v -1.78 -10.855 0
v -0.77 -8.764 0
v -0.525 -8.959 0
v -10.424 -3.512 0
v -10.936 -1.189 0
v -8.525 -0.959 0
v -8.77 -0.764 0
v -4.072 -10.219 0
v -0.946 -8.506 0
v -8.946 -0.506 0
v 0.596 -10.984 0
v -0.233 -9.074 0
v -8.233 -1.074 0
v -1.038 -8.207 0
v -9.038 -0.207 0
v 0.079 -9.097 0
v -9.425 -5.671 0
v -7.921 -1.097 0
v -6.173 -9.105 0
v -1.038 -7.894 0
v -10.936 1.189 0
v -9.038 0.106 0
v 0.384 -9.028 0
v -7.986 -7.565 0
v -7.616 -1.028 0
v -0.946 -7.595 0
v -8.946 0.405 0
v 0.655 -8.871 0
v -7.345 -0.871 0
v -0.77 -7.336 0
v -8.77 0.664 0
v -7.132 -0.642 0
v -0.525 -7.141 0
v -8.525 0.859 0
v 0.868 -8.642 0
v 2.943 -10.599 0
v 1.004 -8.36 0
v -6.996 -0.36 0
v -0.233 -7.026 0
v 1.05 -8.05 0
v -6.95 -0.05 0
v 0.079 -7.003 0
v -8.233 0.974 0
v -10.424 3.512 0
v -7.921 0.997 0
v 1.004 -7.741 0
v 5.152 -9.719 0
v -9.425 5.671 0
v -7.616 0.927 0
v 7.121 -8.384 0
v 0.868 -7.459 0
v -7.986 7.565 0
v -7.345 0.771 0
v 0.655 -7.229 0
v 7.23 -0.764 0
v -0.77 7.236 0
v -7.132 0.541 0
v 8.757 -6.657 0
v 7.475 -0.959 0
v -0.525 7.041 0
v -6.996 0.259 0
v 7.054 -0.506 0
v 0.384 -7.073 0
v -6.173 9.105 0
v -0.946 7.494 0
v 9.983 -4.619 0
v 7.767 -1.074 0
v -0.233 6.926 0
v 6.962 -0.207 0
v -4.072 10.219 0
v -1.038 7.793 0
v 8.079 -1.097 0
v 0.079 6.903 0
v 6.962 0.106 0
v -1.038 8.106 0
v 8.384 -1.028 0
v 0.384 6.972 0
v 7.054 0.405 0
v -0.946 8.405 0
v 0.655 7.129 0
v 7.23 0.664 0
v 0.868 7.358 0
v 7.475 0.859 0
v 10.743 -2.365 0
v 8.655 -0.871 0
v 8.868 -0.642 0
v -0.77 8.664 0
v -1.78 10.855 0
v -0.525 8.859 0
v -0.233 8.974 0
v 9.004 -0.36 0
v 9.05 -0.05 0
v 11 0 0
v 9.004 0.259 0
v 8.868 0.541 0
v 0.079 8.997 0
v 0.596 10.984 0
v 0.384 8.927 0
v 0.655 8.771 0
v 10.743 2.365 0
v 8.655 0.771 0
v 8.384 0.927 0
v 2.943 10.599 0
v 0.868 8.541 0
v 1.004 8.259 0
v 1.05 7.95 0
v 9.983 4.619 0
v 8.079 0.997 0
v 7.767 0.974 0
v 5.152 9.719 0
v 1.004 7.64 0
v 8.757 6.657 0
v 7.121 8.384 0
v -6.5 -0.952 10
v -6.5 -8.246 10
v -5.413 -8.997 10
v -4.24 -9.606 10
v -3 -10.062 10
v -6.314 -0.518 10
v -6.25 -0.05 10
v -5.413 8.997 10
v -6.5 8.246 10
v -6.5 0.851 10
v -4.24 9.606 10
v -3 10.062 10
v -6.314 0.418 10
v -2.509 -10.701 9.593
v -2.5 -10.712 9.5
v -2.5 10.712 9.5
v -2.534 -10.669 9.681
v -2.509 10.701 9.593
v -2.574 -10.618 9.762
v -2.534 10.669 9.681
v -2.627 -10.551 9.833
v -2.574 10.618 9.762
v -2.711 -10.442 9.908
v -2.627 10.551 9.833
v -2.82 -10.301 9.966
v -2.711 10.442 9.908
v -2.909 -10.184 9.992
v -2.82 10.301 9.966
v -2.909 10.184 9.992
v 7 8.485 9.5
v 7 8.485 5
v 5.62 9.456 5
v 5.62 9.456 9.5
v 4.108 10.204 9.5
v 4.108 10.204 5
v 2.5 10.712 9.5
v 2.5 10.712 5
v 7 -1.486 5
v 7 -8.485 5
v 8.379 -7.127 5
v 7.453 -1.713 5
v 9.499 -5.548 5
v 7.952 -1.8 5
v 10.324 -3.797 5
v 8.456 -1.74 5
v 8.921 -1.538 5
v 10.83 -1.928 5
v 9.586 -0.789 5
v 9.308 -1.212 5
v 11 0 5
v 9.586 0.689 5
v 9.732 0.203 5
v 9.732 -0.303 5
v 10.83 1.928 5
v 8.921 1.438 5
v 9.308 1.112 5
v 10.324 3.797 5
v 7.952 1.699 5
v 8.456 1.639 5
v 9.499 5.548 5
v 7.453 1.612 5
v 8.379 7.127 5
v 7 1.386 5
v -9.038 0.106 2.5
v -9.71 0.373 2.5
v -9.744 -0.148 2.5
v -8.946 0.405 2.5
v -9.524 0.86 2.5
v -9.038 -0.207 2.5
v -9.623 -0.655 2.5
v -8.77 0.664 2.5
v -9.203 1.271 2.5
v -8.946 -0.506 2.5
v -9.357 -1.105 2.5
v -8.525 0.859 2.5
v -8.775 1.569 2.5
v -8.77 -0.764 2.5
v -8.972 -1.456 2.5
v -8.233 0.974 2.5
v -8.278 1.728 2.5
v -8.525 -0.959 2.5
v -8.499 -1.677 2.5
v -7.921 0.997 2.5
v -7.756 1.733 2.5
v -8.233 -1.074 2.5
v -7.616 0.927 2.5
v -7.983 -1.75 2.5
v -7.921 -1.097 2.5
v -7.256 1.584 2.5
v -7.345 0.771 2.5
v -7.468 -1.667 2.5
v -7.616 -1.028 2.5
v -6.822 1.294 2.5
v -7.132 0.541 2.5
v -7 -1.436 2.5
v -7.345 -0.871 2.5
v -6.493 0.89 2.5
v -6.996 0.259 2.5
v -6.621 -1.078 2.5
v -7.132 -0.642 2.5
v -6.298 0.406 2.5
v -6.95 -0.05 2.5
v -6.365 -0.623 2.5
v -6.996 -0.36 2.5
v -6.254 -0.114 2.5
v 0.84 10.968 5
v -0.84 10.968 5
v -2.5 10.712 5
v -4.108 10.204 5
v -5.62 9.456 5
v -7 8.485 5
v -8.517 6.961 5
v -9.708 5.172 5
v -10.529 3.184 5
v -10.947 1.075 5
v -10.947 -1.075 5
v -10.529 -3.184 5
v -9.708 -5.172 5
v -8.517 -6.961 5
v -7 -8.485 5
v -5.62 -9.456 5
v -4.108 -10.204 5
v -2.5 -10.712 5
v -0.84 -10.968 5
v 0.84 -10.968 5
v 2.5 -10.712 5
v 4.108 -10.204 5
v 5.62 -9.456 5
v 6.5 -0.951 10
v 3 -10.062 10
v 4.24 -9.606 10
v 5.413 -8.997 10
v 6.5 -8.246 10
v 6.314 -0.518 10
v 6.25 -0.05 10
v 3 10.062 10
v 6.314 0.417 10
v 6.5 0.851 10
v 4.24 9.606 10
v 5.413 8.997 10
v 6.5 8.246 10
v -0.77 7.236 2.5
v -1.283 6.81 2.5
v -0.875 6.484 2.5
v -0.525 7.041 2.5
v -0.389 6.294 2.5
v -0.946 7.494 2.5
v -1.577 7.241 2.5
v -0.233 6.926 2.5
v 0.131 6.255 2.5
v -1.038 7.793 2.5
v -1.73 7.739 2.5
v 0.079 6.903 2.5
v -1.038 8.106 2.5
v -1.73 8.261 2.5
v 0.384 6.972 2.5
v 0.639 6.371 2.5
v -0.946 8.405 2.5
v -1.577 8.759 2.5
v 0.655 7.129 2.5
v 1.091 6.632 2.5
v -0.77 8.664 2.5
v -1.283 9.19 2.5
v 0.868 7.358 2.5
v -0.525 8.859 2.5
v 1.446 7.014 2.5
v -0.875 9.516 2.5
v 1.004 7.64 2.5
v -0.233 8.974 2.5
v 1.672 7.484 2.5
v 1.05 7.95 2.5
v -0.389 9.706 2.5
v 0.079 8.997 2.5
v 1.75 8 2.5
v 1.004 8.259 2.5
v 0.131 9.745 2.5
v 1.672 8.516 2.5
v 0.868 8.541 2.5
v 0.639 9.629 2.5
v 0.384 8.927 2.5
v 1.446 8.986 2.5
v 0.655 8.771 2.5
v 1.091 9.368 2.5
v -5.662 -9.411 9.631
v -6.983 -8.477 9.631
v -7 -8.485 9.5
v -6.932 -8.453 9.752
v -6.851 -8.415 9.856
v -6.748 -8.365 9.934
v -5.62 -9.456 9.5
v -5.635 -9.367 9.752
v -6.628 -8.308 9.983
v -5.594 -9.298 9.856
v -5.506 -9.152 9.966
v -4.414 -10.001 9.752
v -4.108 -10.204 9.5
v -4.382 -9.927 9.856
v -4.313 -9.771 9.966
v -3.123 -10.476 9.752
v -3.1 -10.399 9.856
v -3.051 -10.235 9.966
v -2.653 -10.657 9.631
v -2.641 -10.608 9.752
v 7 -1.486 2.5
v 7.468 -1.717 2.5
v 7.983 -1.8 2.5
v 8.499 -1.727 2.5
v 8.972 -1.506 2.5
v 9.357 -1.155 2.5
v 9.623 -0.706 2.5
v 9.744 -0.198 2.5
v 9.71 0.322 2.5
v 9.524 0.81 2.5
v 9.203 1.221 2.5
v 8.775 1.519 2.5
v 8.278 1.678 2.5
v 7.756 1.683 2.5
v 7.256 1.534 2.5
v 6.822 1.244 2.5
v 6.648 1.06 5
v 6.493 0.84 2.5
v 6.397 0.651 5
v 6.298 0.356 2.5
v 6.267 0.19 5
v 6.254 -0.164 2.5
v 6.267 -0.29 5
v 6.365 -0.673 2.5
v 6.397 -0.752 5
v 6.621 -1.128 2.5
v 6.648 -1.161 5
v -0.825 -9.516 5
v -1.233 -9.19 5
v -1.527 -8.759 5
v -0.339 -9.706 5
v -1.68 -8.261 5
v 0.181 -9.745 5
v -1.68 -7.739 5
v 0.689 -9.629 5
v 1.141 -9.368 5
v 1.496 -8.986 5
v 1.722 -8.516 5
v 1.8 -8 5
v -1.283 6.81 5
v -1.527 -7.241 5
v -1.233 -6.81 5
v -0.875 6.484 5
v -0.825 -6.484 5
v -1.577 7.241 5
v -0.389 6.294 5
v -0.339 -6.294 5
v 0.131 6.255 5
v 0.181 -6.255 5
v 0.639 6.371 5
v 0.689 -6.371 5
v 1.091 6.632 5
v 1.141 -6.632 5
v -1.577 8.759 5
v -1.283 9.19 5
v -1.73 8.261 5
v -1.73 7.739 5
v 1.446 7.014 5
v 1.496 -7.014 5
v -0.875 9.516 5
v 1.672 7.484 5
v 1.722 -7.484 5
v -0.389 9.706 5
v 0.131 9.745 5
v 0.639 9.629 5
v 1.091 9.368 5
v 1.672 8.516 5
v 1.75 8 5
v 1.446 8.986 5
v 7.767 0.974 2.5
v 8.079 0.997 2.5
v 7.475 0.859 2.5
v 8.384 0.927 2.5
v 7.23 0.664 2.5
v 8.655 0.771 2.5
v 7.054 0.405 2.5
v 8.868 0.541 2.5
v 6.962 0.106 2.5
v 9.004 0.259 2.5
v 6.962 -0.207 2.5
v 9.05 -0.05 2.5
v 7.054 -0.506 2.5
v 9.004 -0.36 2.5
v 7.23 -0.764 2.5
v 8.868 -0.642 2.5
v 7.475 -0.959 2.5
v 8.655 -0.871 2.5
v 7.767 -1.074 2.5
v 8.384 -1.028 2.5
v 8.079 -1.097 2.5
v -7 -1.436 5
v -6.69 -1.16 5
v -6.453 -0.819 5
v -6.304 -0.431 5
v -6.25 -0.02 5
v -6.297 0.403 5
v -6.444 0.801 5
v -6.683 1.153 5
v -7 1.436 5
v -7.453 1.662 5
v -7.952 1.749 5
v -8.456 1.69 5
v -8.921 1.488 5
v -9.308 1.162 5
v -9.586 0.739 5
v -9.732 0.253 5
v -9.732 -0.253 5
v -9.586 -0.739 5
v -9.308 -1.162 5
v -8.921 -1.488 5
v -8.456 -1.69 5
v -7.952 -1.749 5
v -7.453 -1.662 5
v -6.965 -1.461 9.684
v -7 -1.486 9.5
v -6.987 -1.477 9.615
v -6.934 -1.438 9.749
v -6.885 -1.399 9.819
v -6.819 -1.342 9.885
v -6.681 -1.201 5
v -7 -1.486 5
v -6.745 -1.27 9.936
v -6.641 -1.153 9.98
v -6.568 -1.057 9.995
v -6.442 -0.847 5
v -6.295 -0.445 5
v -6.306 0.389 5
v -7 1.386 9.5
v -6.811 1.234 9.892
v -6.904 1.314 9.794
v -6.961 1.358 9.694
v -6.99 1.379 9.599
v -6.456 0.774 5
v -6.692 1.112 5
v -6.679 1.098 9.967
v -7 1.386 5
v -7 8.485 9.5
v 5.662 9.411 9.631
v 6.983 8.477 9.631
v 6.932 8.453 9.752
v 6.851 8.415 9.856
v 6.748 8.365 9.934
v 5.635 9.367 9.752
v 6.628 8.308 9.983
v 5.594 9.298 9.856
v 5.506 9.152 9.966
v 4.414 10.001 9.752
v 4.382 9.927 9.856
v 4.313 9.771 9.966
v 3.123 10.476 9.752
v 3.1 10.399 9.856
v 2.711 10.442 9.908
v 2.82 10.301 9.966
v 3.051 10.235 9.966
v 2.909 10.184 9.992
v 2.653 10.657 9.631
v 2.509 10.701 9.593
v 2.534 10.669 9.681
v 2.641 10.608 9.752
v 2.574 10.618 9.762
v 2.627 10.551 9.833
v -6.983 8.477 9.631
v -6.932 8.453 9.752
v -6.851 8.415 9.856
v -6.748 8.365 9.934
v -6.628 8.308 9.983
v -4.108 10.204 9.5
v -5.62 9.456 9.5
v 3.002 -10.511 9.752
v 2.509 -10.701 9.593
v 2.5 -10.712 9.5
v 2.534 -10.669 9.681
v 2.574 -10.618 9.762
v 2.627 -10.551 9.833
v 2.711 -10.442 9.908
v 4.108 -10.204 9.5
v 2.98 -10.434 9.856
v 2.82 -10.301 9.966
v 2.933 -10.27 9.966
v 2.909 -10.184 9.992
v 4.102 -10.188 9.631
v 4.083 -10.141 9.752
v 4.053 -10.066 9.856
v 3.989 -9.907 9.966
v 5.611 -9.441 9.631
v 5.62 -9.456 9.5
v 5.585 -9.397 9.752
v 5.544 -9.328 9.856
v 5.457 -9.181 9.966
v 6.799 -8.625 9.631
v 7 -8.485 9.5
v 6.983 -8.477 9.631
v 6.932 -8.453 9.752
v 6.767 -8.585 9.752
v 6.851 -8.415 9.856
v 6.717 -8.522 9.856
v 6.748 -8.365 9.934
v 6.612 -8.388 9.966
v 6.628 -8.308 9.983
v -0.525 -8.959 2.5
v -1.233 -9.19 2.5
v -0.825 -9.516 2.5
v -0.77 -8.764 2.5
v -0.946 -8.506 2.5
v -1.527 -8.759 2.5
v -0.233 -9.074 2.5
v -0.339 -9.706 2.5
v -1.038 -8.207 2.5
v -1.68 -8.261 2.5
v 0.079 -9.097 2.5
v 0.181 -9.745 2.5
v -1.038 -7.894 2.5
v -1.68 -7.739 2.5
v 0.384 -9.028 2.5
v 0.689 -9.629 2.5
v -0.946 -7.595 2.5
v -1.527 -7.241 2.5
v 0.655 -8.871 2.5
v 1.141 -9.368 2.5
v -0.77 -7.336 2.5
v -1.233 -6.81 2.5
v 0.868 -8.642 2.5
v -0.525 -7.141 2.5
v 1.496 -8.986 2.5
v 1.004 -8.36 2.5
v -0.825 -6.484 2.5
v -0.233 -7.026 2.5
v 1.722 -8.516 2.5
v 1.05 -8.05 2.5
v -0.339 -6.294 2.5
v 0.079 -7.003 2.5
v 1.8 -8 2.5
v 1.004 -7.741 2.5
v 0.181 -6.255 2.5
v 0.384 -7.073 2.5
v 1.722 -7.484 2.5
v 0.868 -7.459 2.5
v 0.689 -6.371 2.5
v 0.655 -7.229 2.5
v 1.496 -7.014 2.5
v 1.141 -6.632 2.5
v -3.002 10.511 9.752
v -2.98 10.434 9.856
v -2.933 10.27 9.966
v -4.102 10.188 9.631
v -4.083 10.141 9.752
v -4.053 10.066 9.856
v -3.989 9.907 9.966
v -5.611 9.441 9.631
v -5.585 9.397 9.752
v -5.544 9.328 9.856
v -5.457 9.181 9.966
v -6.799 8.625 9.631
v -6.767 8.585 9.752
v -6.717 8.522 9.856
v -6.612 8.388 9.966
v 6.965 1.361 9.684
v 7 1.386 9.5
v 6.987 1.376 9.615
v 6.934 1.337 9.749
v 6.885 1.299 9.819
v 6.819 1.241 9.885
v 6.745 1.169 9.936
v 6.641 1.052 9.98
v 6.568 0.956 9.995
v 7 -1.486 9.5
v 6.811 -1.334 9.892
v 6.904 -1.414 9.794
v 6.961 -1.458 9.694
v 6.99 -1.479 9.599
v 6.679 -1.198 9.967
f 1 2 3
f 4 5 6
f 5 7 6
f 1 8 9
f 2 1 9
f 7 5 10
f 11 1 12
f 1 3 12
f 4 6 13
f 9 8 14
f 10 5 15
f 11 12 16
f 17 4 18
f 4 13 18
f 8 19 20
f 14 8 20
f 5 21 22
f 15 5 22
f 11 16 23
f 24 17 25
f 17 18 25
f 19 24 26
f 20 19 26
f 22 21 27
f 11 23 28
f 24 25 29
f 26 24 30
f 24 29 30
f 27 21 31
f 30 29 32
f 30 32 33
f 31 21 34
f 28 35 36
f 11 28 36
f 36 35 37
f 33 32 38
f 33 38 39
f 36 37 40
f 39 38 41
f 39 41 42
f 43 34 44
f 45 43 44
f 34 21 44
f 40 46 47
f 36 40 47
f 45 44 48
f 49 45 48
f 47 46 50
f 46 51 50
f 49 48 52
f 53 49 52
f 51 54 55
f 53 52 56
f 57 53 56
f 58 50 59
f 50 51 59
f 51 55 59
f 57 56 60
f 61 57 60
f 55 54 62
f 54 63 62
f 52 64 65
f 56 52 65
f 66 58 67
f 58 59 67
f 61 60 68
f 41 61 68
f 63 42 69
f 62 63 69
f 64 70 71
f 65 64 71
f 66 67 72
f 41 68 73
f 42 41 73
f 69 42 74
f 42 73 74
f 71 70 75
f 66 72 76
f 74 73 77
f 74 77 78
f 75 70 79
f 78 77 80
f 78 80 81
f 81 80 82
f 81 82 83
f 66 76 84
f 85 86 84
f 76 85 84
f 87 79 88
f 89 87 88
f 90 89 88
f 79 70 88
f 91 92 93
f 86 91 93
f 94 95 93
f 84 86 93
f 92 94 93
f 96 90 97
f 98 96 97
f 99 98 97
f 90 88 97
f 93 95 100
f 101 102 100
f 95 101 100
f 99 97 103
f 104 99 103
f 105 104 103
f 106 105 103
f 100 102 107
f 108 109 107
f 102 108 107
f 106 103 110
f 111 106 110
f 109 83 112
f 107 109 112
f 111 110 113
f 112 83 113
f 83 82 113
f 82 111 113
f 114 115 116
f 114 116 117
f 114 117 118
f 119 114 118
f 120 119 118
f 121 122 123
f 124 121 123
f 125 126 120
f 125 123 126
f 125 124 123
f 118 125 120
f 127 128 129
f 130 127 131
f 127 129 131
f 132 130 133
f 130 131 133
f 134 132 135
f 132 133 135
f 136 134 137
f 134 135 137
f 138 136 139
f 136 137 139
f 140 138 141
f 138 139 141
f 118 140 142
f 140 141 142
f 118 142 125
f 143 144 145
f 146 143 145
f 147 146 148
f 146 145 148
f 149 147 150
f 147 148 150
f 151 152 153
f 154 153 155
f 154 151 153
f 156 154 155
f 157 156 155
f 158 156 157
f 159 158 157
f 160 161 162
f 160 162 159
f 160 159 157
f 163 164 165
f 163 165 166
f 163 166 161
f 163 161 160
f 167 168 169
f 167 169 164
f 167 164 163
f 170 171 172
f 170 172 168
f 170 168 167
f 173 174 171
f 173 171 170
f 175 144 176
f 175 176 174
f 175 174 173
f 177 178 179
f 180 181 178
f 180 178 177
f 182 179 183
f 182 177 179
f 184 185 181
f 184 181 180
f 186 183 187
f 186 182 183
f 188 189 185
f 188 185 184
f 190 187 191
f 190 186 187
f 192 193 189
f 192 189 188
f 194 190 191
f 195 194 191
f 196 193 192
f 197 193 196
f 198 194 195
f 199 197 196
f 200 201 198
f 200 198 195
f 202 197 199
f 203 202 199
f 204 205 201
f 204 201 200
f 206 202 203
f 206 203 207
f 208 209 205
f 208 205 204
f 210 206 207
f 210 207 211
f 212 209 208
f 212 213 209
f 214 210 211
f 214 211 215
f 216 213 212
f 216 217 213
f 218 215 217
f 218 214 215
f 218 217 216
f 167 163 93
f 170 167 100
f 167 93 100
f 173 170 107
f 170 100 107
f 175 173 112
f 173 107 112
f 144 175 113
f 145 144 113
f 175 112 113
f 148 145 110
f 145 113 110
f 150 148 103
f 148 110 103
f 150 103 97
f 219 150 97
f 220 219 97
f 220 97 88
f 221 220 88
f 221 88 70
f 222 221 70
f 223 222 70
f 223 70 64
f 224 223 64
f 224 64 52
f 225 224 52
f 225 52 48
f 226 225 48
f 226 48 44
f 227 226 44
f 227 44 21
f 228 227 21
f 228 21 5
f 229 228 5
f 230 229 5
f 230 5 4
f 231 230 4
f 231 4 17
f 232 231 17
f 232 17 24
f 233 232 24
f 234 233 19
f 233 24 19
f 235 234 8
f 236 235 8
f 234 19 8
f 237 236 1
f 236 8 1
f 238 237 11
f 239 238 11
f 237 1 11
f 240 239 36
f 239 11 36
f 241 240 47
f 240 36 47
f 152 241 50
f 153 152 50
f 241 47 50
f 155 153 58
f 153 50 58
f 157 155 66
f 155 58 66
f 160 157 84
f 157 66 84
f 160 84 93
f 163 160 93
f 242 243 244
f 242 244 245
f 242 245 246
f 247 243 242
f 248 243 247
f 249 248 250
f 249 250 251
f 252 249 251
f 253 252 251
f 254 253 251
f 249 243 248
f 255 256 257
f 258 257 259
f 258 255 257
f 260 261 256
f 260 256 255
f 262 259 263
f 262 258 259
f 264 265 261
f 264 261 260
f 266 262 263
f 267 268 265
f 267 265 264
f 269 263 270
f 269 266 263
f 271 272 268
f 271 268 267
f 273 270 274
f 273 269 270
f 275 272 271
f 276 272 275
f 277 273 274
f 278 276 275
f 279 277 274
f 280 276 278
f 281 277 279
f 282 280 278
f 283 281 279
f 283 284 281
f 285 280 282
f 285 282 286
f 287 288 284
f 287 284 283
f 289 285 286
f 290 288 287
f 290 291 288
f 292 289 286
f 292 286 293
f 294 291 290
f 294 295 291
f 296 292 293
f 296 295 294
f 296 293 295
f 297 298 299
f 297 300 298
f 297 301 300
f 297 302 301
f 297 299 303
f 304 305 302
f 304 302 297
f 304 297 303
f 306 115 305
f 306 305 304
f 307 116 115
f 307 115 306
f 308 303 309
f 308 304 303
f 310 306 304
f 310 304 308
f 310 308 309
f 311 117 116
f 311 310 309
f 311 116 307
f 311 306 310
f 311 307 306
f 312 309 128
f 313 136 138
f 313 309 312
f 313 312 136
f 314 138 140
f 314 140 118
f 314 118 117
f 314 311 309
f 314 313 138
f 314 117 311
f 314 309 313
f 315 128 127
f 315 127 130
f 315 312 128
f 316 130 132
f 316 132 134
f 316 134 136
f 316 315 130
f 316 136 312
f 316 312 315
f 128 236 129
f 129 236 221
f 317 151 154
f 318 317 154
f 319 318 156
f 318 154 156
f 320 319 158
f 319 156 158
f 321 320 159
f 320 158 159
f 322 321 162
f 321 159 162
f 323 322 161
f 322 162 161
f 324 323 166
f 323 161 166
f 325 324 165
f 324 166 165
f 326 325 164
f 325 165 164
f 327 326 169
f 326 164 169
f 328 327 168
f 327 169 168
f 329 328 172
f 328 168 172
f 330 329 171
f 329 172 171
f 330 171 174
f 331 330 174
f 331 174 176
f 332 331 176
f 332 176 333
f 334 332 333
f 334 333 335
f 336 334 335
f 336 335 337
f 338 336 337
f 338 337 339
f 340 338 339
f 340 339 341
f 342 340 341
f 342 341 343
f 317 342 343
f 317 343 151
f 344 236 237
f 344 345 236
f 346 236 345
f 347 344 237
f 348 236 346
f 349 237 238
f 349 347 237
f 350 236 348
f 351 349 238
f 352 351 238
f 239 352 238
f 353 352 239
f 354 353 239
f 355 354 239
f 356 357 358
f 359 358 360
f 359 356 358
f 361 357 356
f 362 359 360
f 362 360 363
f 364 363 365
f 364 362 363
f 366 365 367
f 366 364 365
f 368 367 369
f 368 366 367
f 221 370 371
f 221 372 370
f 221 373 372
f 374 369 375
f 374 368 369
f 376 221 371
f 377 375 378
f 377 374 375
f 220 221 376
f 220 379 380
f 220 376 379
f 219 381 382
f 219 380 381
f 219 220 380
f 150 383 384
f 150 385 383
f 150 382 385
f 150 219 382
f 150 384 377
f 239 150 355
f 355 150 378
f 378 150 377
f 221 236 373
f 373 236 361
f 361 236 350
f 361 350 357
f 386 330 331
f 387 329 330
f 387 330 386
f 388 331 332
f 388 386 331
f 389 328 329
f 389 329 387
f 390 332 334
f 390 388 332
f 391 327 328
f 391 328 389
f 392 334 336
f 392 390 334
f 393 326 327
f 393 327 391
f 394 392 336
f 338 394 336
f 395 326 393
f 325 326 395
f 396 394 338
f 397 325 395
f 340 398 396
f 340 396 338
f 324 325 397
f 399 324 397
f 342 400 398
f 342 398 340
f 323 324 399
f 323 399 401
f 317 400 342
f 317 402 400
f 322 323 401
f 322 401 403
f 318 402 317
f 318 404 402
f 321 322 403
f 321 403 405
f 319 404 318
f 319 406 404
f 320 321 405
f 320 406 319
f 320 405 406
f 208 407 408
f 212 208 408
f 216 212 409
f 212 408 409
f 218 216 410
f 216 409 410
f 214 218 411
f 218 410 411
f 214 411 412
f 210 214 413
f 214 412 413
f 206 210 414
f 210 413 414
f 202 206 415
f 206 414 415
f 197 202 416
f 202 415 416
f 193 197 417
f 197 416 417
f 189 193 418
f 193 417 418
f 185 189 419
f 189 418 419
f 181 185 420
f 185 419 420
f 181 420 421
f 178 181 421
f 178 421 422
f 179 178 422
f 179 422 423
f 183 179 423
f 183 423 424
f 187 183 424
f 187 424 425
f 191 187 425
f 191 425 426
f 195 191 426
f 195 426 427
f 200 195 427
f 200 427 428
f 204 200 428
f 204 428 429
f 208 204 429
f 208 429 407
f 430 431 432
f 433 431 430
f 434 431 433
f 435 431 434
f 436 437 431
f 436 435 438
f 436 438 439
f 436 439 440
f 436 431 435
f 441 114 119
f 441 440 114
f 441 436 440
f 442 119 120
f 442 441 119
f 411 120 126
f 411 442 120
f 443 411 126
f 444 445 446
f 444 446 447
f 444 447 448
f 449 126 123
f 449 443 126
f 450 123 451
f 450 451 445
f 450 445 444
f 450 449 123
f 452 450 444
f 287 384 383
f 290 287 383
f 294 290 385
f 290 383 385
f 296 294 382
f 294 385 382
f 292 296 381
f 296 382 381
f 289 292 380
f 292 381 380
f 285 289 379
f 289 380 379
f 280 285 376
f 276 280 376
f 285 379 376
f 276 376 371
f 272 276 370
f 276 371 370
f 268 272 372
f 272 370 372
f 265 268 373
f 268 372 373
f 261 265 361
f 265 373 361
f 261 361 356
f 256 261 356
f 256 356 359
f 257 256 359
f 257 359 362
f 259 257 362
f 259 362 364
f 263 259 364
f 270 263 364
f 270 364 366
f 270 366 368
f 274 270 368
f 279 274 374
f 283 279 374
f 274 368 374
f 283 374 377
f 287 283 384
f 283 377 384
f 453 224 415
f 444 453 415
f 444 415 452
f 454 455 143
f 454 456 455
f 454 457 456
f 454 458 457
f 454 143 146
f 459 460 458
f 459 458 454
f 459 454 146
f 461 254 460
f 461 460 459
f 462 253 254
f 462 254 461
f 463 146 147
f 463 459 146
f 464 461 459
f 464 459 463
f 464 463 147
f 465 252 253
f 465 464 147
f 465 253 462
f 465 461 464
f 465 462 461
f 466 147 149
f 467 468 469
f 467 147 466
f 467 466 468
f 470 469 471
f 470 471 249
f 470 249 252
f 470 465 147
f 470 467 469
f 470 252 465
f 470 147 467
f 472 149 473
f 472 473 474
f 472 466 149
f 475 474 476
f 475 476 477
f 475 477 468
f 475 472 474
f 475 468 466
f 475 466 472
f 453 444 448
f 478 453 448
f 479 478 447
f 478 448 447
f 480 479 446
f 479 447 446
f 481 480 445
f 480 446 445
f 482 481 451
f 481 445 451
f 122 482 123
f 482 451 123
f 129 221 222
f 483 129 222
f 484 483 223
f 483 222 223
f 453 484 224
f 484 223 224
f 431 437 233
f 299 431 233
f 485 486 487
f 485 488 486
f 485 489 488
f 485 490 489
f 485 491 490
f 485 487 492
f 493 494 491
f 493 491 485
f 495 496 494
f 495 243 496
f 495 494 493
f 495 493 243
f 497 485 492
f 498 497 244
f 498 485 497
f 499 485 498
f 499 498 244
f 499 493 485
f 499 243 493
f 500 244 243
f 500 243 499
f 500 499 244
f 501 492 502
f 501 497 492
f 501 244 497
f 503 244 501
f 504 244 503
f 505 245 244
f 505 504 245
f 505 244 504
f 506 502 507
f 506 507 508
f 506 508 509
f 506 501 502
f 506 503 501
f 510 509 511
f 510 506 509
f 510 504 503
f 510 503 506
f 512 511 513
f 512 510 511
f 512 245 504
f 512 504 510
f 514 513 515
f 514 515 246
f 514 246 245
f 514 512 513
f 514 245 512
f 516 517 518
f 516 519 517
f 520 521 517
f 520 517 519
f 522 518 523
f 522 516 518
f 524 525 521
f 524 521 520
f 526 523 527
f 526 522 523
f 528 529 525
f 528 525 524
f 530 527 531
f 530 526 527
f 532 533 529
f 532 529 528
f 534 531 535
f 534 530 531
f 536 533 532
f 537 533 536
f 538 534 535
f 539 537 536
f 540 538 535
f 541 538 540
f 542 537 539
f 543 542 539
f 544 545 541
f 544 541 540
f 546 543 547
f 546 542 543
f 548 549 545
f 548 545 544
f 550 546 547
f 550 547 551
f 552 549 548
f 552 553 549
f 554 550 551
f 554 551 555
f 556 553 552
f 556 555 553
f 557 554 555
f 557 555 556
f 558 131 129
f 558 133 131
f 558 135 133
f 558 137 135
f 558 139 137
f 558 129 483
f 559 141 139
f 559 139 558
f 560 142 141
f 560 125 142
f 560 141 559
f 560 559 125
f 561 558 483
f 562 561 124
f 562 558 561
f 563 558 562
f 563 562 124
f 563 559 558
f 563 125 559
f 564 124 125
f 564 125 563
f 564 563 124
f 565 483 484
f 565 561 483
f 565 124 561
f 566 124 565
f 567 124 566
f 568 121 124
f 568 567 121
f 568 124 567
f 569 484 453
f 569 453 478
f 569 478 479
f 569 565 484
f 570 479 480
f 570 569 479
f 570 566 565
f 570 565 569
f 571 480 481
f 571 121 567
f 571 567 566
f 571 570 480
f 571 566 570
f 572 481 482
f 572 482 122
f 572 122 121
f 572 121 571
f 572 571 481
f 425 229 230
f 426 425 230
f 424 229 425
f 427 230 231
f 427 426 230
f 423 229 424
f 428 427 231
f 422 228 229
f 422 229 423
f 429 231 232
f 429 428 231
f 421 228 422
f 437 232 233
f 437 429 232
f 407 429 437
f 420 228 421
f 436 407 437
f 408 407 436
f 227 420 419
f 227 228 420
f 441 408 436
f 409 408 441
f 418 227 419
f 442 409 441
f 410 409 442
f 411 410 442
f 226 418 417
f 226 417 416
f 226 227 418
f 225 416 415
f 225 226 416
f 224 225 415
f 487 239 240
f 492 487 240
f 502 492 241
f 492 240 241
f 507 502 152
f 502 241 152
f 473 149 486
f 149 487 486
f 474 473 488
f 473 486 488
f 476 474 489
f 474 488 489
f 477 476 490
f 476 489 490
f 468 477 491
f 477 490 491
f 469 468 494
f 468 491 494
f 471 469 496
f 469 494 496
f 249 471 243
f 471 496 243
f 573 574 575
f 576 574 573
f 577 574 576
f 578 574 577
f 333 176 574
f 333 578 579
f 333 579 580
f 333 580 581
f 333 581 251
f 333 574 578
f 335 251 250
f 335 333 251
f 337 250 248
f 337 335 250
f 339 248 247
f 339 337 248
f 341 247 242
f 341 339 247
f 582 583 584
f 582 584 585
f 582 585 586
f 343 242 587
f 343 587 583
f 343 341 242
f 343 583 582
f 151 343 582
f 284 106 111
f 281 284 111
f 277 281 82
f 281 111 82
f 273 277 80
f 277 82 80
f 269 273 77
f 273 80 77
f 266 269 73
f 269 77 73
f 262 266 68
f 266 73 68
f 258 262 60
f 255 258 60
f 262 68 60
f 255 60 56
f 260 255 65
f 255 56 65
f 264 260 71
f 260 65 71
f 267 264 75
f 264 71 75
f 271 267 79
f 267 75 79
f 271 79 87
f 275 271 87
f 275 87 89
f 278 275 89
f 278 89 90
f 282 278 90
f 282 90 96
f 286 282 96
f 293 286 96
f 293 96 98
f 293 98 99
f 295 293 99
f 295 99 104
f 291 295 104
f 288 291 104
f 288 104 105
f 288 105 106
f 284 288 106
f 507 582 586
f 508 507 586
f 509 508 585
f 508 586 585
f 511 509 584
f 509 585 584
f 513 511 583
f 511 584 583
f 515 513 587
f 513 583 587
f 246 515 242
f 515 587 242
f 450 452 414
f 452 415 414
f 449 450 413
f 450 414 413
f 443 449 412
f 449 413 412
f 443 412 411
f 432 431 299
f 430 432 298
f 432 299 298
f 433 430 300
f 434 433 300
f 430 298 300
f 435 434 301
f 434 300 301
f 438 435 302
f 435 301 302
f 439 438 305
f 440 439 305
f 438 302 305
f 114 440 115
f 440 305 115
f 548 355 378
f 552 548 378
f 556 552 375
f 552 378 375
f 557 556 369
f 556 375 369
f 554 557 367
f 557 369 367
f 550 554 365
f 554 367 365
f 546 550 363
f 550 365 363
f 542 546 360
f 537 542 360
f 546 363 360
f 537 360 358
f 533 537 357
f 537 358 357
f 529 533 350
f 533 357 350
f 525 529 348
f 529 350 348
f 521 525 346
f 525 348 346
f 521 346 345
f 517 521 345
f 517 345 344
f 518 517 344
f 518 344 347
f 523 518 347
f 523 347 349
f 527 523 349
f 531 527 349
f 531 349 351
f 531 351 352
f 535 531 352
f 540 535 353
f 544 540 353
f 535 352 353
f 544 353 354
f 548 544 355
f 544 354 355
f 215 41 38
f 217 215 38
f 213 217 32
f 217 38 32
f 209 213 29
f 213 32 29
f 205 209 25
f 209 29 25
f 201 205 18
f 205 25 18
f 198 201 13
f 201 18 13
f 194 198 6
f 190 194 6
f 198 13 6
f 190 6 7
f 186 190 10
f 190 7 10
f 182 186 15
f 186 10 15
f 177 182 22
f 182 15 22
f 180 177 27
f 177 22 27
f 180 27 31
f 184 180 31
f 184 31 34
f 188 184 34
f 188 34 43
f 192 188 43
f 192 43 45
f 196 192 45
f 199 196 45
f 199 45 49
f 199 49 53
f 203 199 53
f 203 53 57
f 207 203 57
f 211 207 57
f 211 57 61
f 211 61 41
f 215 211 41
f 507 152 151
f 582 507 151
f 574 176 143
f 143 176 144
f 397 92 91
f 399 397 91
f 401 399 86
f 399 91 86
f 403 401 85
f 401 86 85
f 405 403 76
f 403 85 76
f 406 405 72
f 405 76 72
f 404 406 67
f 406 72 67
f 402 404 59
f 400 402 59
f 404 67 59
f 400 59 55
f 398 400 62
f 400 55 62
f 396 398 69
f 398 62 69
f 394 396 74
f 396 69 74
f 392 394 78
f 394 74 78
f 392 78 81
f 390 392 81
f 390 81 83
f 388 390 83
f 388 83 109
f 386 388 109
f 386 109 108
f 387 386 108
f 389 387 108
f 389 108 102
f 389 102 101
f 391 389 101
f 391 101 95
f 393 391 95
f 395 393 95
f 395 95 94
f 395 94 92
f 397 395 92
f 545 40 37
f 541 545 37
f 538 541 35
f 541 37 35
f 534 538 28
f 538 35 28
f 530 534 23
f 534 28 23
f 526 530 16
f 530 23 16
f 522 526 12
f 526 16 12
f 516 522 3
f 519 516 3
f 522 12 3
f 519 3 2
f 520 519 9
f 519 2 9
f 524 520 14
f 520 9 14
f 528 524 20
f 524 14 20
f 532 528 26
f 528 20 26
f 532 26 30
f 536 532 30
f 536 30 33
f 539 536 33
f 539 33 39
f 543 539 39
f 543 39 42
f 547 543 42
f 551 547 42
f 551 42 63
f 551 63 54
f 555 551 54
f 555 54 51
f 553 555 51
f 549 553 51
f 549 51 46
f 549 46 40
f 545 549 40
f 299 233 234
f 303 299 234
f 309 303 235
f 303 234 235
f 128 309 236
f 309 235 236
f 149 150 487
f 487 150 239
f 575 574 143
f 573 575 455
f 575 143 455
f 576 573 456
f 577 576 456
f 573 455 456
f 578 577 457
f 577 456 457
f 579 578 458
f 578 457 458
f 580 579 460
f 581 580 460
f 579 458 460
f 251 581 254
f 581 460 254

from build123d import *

# Parameters (mm, degrees)
ESQUISSE1_R             = 11
BOSS_EXTRU_1_DEPTH      = 5
BOSS_EXTRU_3_DEPTH      = 5
CONG_3_R                = 0.5
ESQUISSE3D1_R           = 1.05
ENL_V_MAT_EXTRU_1_DEPTH = 25.164275332
ESQUISSE3D2_R           = 1.75
ENL_V_MAT_EXTRU_2_DEPTH = 2.5
ESQUISSE4_R             = 1.75
ENL_V_MAT_EXTRU_3_DEPTH = 17.340134669


with BuildPart() as part:
    # Esquisse1 → Boss.-Extru.1 (new body)
    with BuildSketch(Plane.XY):
        Circle(ESQUISSE1_R)
    extrude(amount=BOSS_EXTRU_1_DEPTH)

    # Esquisse2 → Boss.-Extru.3 (add)
    with BuildSketch(Plane.XY.offset(5)):
        with BuildLine():
            ThreePointArc((-2.5, 10.712142643), (-4.878752687, 9.858893053), (-7, 8.485281374))
            Line((-7, 8.485281374), (-7, -8.485281374))
            ThreePointArc((-7, -8.485281374), (-4.878752687, -9.858893053), (-2.5, -10.712142643))
            Line((-2.5, -10.712142643), (-2.5, 10.712142643))
        make_face()
        with BuildLine():
            ThreePointArc((7, 8.485281374), (4.878752687, 9.858893053), (2.5, 10.712142643))
            Line((2.5, 10.712142643), (2.5, -10.712142643))
            ThreePointArc((2.5, -10.712142643), (4.878752687, -9.858893053), (7, -8.485281374))
            Line((7, -8.485281374), (7, 8.485281374))
        make_face()
    extrude(amount=BOSS_EXTRU_3_DEPTH)

    # Congé3
    cong_3_edges = [part.edges().sort_by_distance(p)[0] for p in [
        (4.878752687, 9.858893053, 10),
        (4.878752687, -9.858893053, 10),
        (7, 0, 10),
        (2.5, 0, 10),
        (-4.878752687, 9.858893053, 10),
        (-4.878752687, -9.858893053, 10),
        (-2.5, 0, 10),
        (-7, 0, 10),
    ]]
    fillet(cong_3_edges, radius=CONG_3_R)

    # Esquisse3D1 → Enlèv. mat.-Extru.1 (cut, through all)
    with BuildSketch(Plane(origin=(0.000157277, -8.050163785, 0), x_dir=(0, 1, 0), z_dir=(0, 0, -1))):
        with Locations(Location((0, 0, 0), (0, 0, 90))):
            Circle(ESQUISSE3D1_R)
        with Locations(Location((8, 8, 0), (0, 0, 90))):
            Circle(ESQUISSE3D1_R)
        with Locations(Location((16, 0, 0), (0, 0, 90))):
            Circle(ESQUISSE3D1_R)
        with Locations(Location((8, -8, 0), (0, 0, 90))):
            Circle(ESQUISSE3D1_R)
    extrude(amount=-ENL_V_MAT_EXTRU_1_DEPTH, mode=Mode.SUBTRACT)

    # Esquisse3D2 → Enlèv. mat.-Extru.2 (cut)
    with BuildSketch(Plane(origin=(-8, 0, 5), x_dir=(0.9999950851821525, -0.0031352211308848022, 0), z_dir=(0, 0, 1))):
        with Locations(Location((0, 0, 0), (0, 0, 305.029539812))):
            Circle(ESQUISSE3D2_R)
        with Locations(Location((8.075049898, -7.974722127, 0), (0, 0, 0.179635233))):
            Circle(ESQUISSE3D2_R)
        with Locations(Location((7.974878912, 8.025042451, 0), (0, 0, 0.179635233))):
            Circle(ESQUISSE3D2_R)
        with Locations(Location((16.000078637, 0, 0), (0, 0, 235.329730654))):
            Circle(ESQUISSE3D2_R)
    extrude(amount=-ENL_V_MAT_EXTRU_2_DEPTH, mode=Mode.SUBTRACT)

    # Esquisse4 → Enlèv. mat.-Extru.3 (cut, through all)
    with BuildSketch(Plane.XY.offset(5)):
        with Locations((-7.999842723, -0.050163785)):
            Circle(ESQUISSE4_R)
        with Locations((8.000157277, -0.050163785)):
            Circle(ESQUISSE4_R)
    extrude(amount=ENL_V_MAT_EXTRU_3_DEPTH, mode=Mode.SUBTRACT)


solid = part.part
